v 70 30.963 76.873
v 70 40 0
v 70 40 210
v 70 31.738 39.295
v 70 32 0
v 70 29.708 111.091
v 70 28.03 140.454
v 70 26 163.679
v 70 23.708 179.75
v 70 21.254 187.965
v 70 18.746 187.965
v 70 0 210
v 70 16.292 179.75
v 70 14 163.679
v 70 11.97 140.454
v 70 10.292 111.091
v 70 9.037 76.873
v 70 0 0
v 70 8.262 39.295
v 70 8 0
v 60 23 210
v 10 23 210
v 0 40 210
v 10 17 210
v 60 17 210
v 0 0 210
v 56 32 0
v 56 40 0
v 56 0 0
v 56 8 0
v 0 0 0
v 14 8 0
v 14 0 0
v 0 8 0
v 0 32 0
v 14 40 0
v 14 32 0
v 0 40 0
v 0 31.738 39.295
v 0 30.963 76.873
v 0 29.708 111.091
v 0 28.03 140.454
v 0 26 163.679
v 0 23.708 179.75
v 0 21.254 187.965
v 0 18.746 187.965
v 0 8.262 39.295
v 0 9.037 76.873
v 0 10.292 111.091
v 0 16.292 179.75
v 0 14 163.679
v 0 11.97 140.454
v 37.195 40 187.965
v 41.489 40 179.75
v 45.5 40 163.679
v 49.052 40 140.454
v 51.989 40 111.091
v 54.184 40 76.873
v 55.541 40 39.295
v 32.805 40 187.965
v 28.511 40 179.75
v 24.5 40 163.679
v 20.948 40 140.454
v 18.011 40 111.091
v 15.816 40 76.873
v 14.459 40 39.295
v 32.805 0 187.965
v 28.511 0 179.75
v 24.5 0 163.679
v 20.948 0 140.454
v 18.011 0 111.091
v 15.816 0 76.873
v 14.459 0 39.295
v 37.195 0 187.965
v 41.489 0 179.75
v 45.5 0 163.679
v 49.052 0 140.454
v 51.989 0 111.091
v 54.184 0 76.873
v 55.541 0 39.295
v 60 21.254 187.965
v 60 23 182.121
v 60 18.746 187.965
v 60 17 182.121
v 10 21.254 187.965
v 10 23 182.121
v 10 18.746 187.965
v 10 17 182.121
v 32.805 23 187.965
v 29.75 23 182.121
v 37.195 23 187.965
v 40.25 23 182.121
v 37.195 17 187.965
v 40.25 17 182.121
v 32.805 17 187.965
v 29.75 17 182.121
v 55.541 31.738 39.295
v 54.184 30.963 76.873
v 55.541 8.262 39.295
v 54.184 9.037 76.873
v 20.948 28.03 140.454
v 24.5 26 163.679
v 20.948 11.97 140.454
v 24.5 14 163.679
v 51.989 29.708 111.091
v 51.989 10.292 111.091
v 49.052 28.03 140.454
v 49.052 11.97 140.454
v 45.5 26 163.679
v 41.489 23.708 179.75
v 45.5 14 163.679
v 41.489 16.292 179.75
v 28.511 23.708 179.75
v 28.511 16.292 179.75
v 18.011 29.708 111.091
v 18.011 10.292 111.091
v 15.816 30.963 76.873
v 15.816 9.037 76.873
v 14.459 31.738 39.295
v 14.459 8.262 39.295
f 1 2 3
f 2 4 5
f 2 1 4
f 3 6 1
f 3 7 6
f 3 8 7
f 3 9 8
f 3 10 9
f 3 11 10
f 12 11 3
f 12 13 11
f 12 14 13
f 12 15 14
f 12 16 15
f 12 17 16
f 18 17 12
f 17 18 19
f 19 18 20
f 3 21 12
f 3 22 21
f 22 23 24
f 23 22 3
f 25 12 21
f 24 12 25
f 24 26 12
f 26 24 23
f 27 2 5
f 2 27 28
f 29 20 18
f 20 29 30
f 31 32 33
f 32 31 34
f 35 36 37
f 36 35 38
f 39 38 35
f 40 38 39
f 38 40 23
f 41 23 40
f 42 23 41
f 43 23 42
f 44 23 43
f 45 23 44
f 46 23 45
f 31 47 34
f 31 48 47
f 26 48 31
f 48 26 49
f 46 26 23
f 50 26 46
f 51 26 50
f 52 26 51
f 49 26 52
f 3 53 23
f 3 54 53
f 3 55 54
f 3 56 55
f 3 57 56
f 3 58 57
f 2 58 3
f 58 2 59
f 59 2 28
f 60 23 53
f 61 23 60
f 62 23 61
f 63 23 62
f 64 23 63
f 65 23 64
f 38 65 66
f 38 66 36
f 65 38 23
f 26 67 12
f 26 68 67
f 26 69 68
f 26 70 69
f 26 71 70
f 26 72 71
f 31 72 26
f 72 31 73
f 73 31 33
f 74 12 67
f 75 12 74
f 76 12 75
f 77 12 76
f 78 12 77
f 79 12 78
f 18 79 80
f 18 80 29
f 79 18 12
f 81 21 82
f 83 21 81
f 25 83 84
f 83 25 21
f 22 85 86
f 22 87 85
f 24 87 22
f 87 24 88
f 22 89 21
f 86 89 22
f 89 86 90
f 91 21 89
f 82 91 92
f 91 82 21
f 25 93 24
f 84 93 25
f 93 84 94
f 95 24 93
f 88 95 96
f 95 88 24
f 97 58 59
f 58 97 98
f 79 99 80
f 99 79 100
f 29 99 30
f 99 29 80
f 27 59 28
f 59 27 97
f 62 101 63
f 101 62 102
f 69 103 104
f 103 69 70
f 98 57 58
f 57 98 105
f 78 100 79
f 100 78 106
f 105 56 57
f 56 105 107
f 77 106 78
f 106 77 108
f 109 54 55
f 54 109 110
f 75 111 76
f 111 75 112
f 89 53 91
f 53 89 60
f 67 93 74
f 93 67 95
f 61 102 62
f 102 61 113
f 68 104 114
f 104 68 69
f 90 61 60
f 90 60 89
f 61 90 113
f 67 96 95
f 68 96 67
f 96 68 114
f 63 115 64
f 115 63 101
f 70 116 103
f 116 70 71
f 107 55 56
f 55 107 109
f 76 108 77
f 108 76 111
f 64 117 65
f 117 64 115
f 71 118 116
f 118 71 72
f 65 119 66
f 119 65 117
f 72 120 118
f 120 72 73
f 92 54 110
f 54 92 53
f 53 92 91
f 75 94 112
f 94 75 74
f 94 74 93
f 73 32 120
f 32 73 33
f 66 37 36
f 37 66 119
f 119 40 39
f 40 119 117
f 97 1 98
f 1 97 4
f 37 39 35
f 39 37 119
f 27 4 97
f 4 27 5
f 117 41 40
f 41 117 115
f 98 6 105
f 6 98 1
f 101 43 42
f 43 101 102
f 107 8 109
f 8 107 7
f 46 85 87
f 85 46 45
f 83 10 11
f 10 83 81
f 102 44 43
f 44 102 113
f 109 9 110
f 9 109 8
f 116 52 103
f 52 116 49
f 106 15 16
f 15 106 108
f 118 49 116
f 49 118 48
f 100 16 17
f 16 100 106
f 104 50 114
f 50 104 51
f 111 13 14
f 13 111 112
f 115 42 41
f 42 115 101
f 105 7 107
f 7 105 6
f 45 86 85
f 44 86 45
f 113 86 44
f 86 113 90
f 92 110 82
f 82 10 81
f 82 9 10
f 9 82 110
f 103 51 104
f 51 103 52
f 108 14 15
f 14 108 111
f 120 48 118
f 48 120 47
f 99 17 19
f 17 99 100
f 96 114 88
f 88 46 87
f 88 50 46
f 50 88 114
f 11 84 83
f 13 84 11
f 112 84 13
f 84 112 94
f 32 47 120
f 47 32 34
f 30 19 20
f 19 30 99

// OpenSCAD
h = 210;
w = 70;
d = 40;
eps = 0.01;

difference() {
    cube([ w, d, h ]);

    translate( [ 10, 17, -eps ] ) {
        cube([ w - 2*10, 6, h + 2*eps]);
    }
    
    translate( [ w/2, d+eps, 0 ] ) {
        rotate( a=90, v=[ 1, 0, 0] ) {
            scale([ 1, h/w*3, 1]) {
                cylinder( h = d+2*eps, r = w*0.3 );
            }
        }
    }

    translate( [ 0, d/2, 0 ] ) {
        rotate( a=90, v=[ 0, 0, 1] )
        rotate( a=90, v=[ 1, 0, 0] ) {
            scale([ 1, h/d*3, 1]) {
                cylinder( h = w+2*eps, r = d*0.3 );
            }
        }
   }
}
